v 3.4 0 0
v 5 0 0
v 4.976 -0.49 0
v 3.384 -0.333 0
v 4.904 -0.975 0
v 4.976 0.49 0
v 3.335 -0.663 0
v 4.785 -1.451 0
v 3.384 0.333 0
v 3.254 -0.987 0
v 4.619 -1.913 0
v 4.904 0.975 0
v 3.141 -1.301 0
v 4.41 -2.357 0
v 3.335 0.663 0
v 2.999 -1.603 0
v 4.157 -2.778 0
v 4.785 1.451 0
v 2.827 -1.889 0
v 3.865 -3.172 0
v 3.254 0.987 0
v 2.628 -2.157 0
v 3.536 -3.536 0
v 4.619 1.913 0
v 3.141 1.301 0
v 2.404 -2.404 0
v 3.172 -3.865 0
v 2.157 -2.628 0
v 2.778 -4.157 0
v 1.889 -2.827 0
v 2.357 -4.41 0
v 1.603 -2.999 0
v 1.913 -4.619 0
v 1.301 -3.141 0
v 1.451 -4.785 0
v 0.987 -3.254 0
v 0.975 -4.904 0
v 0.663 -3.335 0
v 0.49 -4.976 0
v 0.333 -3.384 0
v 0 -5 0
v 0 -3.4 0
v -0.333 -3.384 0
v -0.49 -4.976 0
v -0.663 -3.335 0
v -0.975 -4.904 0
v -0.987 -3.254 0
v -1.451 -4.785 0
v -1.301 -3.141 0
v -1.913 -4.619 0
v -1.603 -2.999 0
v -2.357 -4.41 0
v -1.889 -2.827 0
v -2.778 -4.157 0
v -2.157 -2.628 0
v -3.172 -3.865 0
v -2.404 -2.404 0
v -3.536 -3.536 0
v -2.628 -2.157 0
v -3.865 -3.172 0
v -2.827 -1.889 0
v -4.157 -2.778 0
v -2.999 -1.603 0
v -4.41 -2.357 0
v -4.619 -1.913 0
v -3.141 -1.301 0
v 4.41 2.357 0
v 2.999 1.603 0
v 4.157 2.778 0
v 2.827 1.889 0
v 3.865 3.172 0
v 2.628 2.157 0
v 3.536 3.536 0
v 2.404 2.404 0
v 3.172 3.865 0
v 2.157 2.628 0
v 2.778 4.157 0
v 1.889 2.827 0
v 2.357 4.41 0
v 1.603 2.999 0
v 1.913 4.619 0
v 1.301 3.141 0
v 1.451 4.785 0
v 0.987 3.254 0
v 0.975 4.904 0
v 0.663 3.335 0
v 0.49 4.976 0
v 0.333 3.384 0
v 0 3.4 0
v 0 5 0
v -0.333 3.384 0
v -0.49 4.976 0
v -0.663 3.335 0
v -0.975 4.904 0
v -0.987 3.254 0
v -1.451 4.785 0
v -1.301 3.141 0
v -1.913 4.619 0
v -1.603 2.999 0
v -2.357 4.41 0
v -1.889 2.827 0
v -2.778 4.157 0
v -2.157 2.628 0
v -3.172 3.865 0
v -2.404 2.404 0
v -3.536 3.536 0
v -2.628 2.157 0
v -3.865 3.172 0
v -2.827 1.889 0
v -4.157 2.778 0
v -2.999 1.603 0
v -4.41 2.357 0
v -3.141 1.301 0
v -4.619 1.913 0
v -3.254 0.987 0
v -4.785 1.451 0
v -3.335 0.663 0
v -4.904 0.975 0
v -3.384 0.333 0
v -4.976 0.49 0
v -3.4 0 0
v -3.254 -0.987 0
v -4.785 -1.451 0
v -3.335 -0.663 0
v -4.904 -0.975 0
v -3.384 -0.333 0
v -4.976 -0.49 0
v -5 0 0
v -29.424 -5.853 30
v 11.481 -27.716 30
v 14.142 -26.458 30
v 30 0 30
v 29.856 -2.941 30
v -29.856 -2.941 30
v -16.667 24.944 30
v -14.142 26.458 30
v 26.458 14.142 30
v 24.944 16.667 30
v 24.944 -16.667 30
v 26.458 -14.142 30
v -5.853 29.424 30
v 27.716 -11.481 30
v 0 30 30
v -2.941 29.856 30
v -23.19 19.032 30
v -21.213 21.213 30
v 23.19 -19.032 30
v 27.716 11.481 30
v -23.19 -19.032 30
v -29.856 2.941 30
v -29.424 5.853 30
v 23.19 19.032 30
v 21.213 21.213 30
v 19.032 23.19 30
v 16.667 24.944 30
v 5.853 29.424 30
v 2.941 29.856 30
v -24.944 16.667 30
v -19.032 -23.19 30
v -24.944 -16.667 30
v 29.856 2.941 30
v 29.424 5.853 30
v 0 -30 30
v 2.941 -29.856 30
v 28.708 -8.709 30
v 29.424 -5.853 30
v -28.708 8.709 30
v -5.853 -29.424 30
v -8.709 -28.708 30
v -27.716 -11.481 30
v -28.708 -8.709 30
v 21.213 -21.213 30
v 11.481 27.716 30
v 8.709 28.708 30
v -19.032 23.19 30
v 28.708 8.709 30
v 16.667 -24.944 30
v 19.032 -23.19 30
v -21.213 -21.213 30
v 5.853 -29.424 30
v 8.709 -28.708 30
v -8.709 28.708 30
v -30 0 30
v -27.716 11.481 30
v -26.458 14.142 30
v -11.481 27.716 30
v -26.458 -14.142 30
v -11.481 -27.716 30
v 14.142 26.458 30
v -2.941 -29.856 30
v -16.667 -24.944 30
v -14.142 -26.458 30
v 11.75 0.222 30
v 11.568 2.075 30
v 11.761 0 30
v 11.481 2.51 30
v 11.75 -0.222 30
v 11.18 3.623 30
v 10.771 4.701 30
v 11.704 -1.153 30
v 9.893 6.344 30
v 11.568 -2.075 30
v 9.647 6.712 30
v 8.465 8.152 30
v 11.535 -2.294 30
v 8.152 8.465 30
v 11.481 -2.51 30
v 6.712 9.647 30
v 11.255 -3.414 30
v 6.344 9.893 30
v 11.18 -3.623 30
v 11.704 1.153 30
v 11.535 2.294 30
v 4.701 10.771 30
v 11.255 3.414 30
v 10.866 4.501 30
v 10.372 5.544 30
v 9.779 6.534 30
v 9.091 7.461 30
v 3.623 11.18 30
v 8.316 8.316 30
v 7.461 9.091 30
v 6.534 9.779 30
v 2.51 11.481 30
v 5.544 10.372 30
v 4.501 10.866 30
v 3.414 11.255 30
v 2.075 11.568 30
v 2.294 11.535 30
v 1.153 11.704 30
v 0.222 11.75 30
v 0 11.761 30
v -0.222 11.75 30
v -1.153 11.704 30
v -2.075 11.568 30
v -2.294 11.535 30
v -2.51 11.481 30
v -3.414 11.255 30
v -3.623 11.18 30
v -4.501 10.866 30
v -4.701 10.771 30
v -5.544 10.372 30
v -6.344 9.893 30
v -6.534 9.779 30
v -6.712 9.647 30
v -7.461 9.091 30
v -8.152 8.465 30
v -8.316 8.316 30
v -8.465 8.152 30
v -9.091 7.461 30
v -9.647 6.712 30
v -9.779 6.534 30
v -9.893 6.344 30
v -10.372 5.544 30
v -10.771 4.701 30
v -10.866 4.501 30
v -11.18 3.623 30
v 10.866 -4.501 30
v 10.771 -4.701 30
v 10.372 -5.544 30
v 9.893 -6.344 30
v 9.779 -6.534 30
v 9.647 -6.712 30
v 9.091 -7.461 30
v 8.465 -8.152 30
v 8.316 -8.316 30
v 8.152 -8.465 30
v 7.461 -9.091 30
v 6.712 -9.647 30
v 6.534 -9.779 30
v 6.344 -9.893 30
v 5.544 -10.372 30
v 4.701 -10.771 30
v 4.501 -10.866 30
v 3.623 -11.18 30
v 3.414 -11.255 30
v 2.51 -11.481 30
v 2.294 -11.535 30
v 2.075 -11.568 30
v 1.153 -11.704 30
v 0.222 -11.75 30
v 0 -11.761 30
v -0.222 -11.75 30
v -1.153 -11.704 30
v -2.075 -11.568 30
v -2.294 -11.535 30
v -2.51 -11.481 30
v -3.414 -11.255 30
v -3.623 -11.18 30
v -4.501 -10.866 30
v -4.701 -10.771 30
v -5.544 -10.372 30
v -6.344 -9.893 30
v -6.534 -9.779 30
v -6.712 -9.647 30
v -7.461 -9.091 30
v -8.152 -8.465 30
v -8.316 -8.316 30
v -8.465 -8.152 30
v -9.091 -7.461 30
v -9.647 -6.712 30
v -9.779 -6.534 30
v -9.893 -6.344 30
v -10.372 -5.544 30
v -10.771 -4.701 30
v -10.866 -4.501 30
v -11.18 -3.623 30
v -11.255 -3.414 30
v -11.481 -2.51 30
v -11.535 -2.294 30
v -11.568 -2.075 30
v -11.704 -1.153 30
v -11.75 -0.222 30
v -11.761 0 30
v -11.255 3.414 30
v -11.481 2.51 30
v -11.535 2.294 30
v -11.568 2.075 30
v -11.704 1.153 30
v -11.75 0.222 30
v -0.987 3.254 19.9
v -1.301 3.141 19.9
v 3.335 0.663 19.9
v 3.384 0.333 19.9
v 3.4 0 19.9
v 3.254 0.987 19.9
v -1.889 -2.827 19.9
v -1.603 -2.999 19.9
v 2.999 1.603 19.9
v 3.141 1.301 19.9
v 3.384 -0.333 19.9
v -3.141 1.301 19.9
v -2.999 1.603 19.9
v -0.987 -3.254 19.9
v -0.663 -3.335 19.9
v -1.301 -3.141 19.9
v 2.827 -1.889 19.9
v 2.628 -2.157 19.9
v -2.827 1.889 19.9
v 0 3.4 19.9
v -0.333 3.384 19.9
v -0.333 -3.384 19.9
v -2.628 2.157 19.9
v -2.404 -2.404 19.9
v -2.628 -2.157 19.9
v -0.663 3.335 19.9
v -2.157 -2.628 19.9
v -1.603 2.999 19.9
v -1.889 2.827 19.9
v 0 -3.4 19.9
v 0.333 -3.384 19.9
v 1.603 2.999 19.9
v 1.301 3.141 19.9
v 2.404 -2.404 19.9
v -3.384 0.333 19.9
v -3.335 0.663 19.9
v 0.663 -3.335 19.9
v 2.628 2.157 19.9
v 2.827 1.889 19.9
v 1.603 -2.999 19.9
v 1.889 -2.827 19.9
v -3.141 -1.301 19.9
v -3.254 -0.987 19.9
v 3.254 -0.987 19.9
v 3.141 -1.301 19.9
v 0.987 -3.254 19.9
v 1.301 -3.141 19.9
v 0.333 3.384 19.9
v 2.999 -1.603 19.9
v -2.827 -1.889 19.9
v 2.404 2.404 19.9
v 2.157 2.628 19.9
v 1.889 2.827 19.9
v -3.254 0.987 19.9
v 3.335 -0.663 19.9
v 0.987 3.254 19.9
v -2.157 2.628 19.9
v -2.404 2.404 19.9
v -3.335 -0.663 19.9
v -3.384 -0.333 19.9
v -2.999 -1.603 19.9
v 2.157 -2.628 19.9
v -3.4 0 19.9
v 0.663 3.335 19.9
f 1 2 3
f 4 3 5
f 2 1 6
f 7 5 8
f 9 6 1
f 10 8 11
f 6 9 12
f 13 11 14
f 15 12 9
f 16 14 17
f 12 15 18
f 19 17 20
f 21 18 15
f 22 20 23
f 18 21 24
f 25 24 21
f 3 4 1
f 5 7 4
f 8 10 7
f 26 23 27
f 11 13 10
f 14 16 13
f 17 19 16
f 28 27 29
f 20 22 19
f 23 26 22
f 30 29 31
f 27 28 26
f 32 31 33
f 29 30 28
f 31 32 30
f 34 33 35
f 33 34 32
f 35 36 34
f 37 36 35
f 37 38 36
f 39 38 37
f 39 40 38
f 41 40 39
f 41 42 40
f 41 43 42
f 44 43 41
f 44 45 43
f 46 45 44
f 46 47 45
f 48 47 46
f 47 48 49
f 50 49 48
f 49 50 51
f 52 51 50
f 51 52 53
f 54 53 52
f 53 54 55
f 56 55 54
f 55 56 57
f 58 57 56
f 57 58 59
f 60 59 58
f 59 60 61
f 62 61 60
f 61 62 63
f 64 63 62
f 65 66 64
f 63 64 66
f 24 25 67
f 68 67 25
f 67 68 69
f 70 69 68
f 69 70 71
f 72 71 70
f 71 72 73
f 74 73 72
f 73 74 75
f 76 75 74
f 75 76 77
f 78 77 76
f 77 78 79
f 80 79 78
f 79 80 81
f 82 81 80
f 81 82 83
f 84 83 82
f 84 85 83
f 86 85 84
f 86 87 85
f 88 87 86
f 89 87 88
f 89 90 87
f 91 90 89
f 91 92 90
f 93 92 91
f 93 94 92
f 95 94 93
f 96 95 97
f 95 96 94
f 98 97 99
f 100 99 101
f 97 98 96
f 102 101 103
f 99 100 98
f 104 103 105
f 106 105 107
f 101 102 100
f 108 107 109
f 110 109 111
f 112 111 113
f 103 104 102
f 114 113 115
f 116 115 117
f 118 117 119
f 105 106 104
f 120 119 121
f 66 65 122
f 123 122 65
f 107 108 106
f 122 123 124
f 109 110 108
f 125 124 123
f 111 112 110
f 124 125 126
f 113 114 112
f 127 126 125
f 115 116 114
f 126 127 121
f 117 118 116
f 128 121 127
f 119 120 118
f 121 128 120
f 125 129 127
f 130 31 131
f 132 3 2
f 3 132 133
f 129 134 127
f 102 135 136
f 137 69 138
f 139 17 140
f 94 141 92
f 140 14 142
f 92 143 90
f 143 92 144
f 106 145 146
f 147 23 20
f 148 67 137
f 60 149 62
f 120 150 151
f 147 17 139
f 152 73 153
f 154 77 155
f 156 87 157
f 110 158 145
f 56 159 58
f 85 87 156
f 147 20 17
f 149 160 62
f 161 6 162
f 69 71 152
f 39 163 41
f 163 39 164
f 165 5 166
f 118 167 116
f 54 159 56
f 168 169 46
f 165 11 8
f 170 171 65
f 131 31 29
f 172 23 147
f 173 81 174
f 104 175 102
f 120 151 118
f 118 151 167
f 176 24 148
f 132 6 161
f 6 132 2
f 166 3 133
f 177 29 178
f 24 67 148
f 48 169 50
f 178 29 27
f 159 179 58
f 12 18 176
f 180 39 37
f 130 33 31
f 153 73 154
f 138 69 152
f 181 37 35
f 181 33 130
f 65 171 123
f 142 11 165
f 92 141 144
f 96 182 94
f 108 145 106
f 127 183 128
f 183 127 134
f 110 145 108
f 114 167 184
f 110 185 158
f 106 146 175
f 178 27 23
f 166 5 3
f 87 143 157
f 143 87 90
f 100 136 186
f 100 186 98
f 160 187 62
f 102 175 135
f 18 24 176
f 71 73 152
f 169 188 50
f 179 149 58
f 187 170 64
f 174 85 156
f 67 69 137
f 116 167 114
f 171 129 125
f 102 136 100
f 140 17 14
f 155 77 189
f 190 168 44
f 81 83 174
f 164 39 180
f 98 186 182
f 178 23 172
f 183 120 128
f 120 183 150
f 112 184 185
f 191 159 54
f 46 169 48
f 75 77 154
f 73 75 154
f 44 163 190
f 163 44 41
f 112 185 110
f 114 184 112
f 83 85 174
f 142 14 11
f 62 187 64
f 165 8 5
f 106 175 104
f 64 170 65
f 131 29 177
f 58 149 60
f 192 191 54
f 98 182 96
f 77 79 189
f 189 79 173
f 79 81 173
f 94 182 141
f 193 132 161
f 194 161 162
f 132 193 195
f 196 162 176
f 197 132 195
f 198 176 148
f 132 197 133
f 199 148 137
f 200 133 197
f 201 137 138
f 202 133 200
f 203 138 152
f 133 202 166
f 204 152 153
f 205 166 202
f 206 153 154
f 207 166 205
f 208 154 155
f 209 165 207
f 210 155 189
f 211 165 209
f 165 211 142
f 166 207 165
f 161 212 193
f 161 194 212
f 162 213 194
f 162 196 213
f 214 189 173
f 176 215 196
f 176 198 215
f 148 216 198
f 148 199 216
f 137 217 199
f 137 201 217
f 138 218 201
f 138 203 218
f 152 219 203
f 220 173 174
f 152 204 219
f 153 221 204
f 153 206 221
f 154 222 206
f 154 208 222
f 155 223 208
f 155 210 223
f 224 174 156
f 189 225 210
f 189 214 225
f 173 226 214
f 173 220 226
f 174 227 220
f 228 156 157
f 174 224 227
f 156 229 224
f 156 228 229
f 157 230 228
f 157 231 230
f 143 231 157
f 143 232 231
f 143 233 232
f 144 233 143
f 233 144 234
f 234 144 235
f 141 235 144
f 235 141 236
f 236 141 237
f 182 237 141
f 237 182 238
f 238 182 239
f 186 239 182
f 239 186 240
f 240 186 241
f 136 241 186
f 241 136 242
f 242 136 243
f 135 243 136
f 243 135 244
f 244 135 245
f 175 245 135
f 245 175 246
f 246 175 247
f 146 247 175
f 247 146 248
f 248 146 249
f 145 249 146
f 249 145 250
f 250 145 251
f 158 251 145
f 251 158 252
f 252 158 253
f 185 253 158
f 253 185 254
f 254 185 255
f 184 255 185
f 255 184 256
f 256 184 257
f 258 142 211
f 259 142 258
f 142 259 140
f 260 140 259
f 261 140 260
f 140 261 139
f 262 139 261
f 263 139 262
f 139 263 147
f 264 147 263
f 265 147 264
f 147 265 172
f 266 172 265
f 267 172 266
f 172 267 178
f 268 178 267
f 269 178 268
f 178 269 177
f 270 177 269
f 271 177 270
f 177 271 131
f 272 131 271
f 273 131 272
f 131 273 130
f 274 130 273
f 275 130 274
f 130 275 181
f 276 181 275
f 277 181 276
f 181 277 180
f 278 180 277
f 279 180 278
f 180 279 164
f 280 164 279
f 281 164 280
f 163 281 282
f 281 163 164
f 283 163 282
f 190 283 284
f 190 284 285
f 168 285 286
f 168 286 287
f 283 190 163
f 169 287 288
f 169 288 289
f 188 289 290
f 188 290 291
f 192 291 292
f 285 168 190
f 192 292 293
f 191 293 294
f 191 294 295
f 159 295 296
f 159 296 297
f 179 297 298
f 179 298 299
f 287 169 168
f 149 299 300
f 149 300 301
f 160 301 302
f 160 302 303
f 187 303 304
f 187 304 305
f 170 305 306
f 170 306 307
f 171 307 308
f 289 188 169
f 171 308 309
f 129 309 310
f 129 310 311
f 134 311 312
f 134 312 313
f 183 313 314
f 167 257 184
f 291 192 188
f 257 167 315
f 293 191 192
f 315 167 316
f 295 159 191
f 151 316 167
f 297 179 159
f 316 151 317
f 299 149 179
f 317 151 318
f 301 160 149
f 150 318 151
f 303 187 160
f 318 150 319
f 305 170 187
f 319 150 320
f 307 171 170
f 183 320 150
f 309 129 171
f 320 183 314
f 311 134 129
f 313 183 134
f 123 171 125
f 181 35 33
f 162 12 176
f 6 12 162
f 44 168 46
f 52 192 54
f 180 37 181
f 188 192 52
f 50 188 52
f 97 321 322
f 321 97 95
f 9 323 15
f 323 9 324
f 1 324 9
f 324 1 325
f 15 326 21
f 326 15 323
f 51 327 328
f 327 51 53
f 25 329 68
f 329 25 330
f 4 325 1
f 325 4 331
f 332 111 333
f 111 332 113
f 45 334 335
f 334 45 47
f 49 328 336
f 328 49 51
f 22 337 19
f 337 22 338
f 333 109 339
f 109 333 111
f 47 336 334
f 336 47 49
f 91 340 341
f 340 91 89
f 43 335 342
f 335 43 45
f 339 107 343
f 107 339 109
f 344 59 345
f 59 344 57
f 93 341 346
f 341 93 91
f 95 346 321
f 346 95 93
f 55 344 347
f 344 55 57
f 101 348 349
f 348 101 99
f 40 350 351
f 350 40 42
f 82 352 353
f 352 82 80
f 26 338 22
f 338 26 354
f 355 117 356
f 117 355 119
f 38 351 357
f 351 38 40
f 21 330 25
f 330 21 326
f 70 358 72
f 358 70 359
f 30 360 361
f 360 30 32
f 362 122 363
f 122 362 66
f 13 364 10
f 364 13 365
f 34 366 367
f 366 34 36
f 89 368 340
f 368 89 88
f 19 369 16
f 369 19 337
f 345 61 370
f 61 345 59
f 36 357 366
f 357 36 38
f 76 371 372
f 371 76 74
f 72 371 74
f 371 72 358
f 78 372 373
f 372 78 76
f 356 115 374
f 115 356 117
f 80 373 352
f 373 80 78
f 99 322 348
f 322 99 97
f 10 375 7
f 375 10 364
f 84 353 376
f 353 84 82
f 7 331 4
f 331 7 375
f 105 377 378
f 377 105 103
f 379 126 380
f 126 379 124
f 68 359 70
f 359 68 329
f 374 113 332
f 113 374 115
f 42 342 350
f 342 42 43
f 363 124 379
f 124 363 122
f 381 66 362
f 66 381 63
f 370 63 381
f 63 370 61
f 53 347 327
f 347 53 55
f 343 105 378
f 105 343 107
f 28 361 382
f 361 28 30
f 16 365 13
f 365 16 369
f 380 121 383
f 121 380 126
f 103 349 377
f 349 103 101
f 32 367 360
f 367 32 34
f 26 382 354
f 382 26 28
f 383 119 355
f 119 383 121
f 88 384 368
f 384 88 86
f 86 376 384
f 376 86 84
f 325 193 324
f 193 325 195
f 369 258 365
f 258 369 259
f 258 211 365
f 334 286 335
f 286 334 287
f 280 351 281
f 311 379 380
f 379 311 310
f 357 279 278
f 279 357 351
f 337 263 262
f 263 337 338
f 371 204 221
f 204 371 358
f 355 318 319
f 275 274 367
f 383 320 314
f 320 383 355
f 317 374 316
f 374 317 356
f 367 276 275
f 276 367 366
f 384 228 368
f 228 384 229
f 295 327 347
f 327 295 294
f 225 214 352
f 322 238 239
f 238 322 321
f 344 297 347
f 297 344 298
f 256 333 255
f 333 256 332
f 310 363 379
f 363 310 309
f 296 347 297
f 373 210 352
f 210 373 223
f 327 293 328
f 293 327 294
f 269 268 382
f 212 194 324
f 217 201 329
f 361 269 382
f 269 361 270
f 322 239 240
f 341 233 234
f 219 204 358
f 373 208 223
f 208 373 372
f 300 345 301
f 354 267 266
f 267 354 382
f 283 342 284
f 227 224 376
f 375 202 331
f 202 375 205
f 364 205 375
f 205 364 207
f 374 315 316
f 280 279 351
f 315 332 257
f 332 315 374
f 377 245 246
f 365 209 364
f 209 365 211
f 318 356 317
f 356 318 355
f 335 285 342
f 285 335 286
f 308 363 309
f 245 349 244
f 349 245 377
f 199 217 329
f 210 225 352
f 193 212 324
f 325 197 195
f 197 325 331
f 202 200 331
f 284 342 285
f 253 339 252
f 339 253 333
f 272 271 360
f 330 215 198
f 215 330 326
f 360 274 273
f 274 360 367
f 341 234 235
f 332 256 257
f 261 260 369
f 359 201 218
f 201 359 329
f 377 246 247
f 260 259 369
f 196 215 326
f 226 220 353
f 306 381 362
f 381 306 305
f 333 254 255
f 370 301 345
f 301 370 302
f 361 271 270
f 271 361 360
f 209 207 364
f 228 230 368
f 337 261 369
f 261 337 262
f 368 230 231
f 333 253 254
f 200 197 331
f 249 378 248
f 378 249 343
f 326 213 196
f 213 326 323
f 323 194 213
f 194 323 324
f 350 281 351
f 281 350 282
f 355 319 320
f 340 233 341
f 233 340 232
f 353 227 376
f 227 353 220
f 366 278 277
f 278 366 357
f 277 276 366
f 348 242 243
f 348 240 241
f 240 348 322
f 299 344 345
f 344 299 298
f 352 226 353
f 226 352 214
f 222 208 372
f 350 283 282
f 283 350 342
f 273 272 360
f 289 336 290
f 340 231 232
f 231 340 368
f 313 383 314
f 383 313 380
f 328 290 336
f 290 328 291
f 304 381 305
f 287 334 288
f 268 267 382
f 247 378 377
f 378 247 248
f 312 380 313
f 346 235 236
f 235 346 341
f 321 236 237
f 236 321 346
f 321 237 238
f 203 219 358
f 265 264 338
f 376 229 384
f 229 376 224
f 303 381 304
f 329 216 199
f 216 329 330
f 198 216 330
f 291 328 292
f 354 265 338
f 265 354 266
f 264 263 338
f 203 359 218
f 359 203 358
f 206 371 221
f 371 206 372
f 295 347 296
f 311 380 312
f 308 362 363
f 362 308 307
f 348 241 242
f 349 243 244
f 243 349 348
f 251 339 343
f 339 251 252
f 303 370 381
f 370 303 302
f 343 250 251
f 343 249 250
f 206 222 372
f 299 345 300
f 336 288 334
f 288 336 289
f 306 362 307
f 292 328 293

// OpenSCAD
// Parameters (mm)
outer_d_spout = 10;          // outer diameter of the straight spout
outer_d_cone_top = 60;       // outer diameter at the funnel rim
height_spout = 20;           // height of the straight spout
height_cone = 30;            // height of the conical section
wall_thickness = 1.6;        // uniform wall thickness
extra = 0.1;                 // amount to extend cutting shapes beyond faces

// Derived inner diameters (mm)
inner_d_spout = outer_d_spout - 2*wall_thickness;          // bore of the spout
inner_d_cone_top = outer_d_cone_top - 2*wall_thickness;   // inner diameter at rim

// Global resolution for curved features
$fn = 64;

// Outer solid (spout + cone)
module outer_funnel() {
    union() {
        // Straight spout (outer cylinder)
        cylinder(h = height_spout,
                 r = outer_d_spout/2);
        // Conical section (outer frustum)
        cylinder(h = height_cone,
                 r1 = outer_d_spout/2,
                 r2 = outer_d_cone_top/2);
    }
}

// Inner bore (cylinder + cone) – extended slightly beyond the outer faces
module inner_bore() {
    union() {
        // Spout bore (cylinder) extending -extra below z=0 and +extra above its top
        translate([0, 0, -extra])
            cylinder(h = height_spout + 2*extra,
                     r = inner_d_spout/2);
        // Conical bore (frustum) extending -extra below its start (z=height_spout) and +extra above its top (z=height_spout+height_cone)
        translate([0, 0, height_spout - extra])
            cylinder(h = height_cone + 2*extra,
                     r1 = inner_d_spout/2,
                     r2 = inner_d_cone_top/2);
    }
}

// Final part: outer shape minus inner bore
difference() {
    outer_funnel();
    inner_bore();
}
